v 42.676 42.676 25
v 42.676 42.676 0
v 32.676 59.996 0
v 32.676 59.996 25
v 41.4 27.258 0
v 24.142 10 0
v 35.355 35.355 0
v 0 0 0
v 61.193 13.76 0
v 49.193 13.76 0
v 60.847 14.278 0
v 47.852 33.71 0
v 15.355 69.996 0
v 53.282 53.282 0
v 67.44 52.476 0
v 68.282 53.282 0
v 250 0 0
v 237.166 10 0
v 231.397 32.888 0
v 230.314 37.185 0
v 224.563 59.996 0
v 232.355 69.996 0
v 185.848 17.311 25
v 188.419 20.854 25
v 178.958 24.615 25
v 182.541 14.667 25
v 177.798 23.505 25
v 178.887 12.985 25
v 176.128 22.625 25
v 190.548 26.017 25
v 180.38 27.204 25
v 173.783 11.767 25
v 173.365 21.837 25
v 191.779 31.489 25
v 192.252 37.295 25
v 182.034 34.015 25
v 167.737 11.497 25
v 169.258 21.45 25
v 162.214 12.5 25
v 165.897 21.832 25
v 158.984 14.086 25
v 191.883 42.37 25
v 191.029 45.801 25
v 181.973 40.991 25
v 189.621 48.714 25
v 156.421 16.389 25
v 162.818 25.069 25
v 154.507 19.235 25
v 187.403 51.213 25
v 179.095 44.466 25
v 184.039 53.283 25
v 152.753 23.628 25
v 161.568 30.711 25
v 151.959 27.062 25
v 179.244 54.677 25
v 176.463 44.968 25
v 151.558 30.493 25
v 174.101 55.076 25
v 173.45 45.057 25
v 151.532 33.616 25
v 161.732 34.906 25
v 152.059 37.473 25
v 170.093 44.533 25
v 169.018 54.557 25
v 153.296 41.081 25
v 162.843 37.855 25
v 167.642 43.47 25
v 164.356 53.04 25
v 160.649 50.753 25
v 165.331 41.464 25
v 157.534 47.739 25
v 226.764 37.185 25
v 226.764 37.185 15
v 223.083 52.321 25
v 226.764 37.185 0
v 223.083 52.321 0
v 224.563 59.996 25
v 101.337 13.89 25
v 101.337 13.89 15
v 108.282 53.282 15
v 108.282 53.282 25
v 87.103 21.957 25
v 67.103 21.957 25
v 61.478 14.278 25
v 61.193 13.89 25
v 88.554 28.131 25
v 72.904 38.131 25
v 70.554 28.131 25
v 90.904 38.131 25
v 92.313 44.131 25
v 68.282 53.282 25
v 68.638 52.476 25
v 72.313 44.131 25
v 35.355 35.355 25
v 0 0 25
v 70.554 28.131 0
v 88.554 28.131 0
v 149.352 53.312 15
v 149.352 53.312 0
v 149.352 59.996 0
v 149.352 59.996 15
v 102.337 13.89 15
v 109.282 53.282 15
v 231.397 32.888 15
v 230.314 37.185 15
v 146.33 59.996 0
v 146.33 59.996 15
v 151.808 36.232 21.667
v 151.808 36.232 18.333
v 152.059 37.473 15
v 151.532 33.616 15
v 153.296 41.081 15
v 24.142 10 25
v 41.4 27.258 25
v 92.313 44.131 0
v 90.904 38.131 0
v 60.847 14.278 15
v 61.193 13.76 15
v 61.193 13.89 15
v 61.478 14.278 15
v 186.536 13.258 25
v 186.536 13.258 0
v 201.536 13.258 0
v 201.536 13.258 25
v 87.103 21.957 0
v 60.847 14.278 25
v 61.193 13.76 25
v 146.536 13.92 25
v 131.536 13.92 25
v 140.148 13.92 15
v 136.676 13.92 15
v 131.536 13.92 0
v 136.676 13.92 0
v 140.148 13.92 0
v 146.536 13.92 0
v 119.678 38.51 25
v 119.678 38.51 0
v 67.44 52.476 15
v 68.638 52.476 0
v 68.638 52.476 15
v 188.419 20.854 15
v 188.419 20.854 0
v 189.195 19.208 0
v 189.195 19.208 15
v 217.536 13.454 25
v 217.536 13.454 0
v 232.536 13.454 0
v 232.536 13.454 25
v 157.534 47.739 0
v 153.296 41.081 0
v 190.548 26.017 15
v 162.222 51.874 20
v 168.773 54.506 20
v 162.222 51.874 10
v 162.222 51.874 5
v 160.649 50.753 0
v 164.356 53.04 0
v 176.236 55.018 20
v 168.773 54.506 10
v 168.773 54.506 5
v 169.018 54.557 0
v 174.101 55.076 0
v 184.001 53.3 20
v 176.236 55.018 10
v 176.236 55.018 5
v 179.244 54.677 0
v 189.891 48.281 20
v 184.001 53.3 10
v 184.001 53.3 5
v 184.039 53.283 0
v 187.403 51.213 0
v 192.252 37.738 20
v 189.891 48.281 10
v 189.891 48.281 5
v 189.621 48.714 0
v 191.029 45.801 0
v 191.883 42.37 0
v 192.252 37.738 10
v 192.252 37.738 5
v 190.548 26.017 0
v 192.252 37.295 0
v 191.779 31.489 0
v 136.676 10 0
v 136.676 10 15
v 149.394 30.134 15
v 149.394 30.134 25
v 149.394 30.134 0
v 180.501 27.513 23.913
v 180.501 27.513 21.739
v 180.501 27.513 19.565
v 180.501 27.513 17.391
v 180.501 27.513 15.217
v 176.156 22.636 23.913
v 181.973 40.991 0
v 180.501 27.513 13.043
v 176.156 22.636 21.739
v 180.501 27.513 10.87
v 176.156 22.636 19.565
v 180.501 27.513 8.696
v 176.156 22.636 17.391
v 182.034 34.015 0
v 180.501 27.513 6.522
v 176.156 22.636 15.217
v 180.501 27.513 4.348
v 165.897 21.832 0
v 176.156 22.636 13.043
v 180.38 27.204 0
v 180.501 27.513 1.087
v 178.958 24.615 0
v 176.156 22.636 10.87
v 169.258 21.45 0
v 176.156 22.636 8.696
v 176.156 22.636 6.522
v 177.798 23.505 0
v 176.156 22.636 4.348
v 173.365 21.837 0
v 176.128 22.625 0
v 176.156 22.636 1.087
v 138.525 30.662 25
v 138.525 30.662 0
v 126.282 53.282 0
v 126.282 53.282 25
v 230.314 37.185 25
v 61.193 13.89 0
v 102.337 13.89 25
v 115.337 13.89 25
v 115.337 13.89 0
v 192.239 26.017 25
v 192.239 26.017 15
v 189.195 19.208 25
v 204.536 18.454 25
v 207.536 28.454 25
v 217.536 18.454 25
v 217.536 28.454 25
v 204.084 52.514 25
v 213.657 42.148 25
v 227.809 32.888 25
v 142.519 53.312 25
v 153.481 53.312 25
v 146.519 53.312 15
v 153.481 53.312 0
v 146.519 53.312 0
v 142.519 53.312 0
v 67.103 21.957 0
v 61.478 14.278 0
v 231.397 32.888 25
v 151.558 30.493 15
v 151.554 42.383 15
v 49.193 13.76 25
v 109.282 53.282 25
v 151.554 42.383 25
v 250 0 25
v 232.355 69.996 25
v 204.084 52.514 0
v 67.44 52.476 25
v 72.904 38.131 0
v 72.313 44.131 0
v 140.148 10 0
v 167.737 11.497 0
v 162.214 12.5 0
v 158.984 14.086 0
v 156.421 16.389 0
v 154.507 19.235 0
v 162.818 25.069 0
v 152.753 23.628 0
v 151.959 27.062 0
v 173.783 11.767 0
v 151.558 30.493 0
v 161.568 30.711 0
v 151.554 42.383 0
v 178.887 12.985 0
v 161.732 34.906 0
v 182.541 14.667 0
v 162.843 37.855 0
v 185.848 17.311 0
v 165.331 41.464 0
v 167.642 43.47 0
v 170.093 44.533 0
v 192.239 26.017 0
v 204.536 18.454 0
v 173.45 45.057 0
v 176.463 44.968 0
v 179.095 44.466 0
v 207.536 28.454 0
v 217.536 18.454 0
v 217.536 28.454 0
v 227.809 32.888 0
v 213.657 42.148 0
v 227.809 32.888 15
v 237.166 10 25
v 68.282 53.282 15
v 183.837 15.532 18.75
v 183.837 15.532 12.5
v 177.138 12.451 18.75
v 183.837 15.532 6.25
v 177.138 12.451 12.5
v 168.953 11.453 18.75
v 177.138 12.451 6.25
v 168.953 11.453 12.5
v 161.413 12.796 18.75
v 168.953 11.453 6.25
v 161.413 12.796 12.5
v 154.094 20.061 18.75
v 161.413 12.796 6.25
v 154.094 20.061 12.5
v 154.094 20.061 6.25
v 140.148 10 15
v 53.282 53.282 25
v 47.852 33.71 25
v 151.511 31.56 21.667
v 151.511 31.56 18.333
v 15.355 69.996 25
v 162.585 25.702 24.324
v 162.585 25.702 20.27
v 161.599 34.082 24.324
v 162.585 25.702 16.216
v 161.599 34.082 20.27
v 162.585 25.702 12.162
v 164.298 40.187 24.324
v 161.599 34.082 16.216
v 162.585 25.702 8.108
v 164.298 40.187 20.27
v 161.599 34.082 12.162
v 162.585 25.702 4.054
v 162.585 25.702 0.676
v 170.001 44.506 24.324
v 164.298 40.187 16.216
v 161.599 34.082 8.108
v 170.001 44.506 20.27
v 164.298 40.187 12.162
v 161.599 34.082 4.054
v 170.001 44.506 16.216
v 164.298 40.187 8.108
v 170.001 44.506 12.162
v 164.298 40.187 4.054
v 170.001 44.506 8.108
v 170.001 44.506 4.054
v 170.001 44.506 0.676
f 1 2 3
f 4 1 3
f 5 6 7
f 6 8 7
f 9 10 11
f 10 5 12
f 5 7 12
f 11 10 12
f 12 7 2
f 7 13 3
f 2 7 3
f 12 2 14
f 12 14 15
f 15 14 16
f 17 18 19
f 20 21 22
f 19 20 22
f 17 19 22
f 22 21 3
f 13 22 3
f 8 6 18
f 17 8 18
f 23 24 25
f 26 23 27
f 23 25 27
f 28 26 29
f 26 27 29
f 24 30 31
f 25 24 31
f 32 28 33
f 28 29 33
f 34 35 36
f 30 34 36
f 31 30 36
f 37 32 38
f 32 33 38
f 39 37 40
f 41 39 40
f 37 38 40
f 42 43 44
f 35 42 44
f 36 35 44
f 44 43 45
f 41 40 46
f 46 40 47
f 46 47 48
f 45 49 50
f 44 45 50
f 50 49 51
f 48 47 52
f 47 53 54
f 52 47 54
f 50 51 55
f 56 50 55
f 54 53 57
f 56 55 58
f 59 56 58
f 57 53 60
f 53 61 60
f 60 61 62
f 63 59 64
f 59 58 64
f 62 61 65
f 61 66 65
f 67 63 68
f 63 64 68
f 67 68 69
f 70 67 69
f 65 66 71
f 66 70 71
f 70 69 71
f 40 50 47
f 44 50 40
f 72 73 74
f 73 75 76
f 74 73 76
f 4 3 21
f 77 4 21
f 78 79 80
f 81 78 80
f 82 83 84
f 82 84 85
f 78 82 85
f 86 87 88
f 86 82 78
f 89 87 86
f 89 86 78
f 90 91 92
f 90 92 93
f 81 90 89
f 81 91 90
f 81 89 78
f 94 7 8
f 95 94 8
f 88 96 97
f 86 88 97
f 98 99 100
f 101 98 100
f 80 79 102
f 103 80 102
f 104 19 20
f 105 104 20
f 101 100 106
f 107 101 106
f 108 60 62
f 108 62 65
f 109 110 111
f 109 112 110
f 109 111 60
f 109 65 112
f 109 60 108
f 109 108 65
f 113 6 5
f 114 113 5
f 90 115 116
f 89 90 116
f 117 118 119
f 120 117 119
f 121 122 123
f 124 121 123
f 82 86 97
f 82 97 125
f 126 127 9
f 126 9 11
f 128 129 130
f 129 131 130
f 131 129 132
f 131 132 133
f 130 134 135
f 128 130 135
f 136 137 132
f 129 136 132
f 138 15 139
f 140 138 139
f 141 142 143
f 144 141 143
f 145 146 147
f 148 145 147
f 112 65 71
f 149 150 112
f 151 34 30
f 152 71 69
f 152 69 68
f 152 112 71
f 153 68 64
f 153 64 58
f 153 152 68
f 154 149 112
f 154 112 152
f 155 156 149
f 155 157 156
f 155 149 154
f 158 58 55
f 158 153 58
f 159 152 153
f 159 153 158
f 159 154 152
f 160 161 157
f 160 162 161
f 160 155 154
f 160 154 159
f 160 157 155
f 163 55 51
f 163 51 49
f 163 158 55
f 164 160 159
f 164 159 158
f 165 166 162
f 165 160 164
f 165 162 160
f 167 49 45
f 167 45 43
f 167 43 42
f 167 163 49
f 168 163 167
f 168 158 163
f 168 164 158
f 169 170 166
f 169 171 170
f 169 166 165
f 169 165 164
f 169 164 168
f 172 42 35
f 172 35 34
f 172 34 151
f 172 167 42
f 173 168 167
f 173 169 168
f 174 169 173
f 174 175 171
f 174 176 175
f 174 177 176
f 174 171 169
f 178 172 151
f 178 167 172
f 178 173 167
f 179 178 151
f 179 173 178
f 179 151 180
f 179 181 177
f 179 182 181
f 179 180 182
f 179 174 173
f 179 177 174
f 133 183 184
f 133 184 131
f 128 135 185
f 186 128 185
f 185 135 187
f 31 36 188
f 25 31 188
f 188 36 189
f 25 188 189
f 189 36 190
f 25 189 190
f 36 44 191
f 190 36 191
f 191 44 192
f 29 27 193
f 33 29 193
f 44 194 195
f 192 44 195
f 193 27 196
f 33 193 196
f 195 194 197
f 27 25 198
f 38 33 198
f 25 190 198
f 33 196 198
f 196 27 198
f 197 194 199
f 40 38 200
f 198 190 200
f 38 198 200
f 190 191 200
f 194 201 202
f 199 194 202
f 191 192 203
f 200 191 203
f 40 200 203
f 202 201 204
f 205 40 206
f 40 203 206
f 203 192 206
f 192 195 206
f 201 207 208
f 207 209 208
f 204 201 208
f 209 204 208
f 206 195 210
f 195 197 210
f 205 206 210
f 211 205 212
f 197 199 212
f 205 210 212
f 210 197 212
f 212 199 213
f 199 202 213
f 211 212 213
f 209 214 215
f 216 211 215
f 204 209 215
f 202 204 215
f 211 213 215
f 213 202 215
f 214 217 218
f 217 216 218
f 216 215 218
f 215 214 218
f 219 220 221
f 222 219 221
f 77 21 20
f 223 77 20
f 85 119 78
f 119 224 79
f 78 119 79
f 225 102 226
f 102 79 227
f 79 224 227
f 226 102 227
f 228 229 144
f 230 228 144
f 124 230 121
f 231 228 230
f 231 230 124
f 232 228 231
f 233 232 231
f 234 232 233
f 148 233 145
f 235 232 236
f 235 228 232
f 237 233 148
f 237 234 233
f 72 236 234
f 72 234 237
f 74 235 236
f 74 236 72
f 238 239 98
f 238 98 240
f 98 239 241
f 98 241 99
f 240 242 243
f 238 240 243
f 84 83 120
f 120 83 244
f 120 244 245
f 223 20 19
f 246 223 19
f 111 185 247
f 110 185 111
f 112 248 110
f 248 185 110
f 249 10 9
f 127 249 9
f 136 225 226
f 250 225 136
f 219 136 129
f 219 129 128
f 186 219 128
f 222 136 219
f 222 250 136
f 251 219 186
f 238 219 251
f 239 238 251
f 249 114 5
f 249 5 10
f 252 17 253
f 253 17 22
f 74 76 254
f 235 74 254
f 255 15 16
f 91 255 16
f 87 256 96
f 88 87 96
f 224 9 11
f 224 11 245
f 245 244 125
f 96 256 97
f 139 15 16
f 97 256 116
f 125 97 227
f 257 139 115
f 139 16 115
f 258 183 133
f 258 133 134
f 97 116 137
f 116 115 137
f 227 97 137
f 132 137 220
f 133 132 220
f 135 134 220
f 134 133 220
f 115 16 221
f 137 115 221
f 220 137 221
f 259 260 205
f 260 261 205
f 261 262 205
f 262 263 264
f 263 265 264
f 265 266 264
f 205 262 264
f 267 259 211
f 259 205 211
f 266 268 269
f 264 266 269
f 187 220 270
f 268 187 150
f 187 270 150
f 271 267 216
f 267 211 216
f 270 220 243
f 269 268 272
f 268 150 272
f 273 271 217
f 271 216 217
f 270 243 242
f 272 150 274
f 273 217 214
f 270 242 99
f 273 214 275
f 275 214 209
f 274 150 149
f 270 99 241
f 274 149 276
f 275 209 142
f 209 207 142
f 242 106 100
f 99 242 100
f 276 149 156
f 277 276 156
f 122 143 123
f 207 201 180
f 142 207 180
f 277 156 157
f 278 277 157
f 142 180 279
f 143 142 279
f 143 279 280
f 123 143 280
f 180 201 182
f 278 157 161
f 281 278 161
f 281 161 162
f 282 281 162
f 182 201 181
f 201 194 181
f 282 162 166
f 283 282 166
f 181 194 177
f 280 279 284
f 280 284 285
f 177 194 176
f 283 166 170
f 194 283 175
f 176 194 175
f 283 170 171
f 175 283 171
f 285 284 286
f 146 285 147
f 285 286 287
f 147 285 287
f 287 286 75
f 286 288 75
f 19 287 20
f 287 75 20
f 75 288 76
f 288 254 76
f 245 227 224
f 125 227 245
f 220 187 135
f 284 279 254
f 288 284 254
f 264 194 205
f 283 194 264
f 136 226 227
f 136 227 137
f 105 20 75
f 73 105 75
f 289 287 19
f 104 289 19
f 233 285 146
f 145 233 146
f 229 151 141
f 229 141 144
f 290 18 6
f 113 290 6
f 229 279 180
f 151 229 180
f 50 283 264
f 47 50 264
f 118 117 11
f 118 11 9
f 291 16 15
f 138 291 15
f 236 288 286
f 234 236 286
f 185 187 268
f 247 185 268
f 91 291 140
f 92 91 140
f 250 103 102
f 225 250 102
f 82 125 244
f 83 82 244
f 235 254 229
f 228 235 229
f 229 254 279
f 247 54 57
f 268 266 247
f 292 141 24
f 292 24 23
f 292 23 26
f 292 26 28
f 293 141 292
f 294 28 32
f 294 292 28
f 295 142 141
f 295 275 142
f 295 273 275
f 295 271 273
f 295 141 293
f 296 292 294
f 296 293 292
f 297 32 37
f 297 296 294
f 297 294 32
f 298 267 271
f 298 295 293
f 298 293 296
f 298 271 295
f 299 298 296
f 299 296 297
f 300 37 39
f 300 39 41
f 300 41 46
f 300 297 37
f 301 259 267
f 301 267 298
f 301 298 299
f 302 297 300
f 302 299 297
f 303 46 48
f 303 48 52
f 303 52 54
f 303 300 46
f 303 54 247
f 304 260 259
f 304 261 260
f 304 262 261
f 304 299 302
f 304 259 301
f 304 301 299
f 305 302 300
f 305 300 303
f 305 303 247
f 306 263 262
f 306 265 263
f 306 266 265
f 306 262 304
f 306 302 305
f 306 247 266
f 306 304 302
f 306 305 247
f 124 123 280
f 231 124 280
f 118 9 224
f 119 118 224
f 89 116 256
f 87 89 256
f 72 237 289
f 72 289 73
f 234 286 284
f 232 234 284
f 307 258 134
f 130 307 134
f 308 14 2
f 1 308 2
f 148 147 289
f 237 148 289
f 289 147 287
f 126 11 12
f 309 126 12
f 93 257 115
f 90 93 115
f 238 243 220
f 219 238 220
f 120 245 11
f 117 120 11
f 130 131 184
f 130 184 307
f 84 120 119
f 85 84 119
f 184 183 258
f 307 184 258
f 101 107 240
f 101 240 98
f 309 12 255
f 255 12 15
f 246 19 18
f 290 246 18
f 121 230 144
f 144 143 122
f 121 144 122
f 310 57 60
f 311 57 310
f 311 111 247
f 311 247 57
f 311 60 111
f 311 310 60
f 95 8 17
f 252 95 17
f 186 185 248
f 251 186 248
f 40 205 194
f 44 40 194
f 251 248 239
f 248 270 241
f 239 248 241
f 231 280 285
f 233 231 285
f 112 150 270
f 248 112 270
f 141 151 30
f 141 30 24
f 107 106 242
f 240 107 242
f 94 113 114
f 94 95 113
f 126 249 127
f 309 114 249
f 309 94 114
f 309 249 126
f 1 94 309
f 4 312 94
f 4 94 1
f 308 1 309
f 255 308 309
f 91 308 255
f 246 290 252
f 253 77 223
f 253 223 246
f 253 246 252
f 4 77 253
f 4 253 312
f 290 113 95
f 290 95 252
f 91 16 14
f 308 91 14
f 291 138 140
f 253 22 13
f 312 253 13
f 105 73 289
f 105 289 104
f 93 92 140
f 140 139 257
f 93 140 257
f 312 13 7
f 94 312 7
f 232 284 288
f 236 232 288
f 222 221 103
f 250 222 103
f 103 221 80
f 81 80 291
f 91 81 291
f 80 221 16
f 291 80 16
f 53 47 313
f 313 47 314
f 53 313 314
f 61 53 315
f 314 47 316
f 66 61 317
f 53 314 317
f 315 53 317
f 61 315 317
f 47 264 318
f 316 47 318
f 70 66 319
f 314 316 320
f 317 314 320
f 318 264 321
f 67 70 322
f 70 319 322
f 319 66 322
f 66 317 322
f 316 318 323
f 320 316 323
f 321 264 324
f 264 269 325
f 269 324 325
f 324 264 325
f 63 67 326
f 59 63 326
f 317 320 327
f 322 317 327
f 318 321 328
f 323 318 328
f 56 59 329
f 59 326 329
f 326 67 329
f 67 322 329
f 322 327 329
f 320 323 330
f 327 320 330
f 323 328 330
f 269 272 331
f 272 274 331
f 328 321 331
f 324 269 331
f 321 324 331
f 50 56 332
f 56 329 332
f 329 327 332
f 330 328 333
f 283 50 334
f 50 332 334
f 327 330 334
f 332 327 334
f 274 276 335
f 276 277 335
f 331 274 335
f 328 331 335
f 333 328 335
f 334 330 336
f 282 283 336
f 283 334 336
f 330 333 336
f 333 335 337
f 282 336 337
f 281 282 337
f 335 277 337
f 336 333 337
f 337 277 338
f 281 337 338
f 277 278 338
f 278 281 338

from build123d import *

# Parameters (mm, degrees)
F1_DEPTH = 25
F0_W     = 3.4720152617
F0_H     = 3.9200305776
F2_DEPTH = 15


# Not quite as in the source:
# - ends of sketch curves that miss each other by under 0.0002 mm in the source are joined
# - the dataset's text gives a spline's control points without its knots; the knots are read off the source's solid
# - a feature names something its author has since deleted; it is built from what else it names


with BuildPart() as f1:
    # F0 (on Top) → F1 (new body)
    with BuildSketch(Plane.XY):
        Polygon((35.3553390593, 35.3553390593), (0, 0), (250, 0), (232.3553390593, 69.9963552107), (15.3553390593, 69.9963552107), align=None)
        Polygon((149.3519097567, 59.9963530121), (224.56330661, 59.9963530121), (230.3136809852, 37.1846226695), (231.3968486735, 32.8876973548), (237.166372237, 10.0000021986), (140.1480585337, 10.0000021986), (136.676043272, 10.0000021986), (24.1421409317, 10.0000021986), (41.4001874912, 27.2580487582), (47.8522307846, 33.7100920516), (42.6758487445, 42.6758487445), (32.6758509431, 59.9963530121), (146.3302671909, 59.9963530121), align=None, mode=Mode.SUBTRACT)
        Polygon((53.2824504623, 53.2824504623), (42.6758487445, 42.6758487445), (47.8522307846, 33.7100920516), (67.4404504829, 52.4758059113), (68.2824504623, 53.2824504623), align=None)
        Polygon((60.8468717116, 14.278005959), (47.8522307846, 33.7100920516), (41.4001874912, 27.2580487582), (49.1933937334, 13.7598195929), (61.1933937334, 13.7598195929), align=None)
    extrude(amount=F1_DEPTH)


with BuildPart() as f1b:
    # F0 (on Top) → F1, piece 2 (new body)
    with BuildSketch(Plane.XY):
        Polygon((88.5540837341, 28.1308456181), (90.9036234209, 38.1308456181), (72.9036234209, 38.1308456181), (70.5540837341, 28.1308456181), align=None)
        Polygon((108.2824504623, 53.2824504623), (68.2824504623, 53.2824504623), (68.6377434378, 52.4758059113), (72.313347233, 44.1308456181), (92.313347233, 44.1308456181), (90.9036234209, 38.1308456181), (88.5540837341, 28.1308456181), (87.1034676285, 21.9568017674), (67.1034676285, 21.9568017674), (61.477565132, 14.278005959), (61.1933937334, 13.8901403418), (101.3365233556, 13.8901403418), align=None)
    extrude(amount=F1_DEPTH)



with BuildPart() as f1c:
    # F0 (on Top) → F1, piece 3 (new body)
    with BuildSketch(Plane.XY):
        Polygon((153.4814404268, 53.3123428967), (149.3519097567, 53.3123428967), (146.5191096067, 53.3123428967), (142.5191015005, 53.3123428967), (138.5251934142, 30.6617645774), (126.2824504623, 53.2824504623), (109.2824504623, 53.2824504623), (102.3365233556, 13.8901403418), (115.3365233556, 13.8901403418), (119.6777277973, 38.5103341671), (131.5355133201, 13.9200327762), (136.676043272, 13.9200327762), (140.1480585337, 13.9200327762), (146.5355133201, 13.9200327762), (149.3944048747, 30.1336124743), (151.5543764817, 42.3834201799), align=None)
    extrude(amount=F1_DEPTH)


with BuildPart() as f1d:
    # F0 (on Top) → F1, piece 4 (new body)
    with BuildSketch(Plane.XY):
        with BuildLine():
            add(Edge.make_bspline(
                [(153.2957728652, 41.0807725054), (153.49766281, 41.5309282211), (155.3500865512, 45.3378659555), (161.5552143615, 53.4867465492), (176.1548241084, 56.3217499328), (193.5548048204, 51.0510310034), (192.6995287251, 33.1029715051), (190.5478645245, 26.016644206)],
                knots=[0.0743708641, 0.0743708641, 0.0743708641, 0.0743708641, 0.0883183193, 0.1917010674, 0.3023367007, 0.4162516271, 0.5490950731, 0.5490950731, 0.5490950731, 0.5490950731], degree=3))
            add(Edge.make_bspline(
                [(151.5315026045, 33.6161878365), (151.6634499925, 36.3480245715), (152.2192517782, 38.6804443414), (153.2957728652, 41.0807725054)],
                knots=[0, 0, 0, 0, 0.0743708641, 0.0743708641, 0.0743708641, 0.0743708641], degree=3))
            add(Edge.make_bspline(
                [(151.5581660211, 30.4933039686), (151.4916370849, 31.5702465606), (151.4833764702, 32.6197850769), (151.5315026045, 33.6161878365)],
                knots=[0.9728741717, 0.9728741717, 0.9728741717, 0.9728741717, 1, 1, 1, 1], degree=3))
            add(Edge.make_bspline(
                [(188.4193204432, 20.8541177869), (186.4225620314, 17.2582664486), (179.6863041093, 11.4034157724), (160.3055787763, 10.4275817806), (153.2214749313, 20.0421386094), (151.7433054324, 27.4963446143), (151.5581660211, 30.4933039686)],
                knots=[0.5854070027, 0.5854070027, 0.5854070027, 0.5854070027, 0.6722296295, 0.7975352428, 0.8973873208, 0.9728741717, 0.9728741717, 0.9728741717, 0.9728741717], degree=3))
            add(Edge.make_bspline(
                [(190.5478645245, 26.016644206), (190.3967980643, 25.5191193687), (189.7761974015, 23.6315541865), (189.0399275657, 21.9717346898), (188.4193204432, 20.8541177869)],
                knots=[0.5490950731, 0.5490950731, 0.5490950731, 0.5490950731, 0.5584218951, 0.5854070027, 0.5854070027, 0.5854070027, 0.5854070027], degree=3))
        make_face()
        with BuildLine():
            add(Edge.make_bspline(
                [(162.8184250503, 25.0692523461), (162.7388528349, 25.2709199434), (162.5250729743, 25.8491123795), (162.2111113791, 26.8772771924), (161.811446171, 28.5859325459), (161.5680124914, 30.3698864013), (161.490617043, 32.0313577817), (161.5032118997, 32.7877081125), (161.5198585813, 33.1337514359)],
                knots=[0.8971962129, 0.8971962129, 0.8971962129, 0.8971962129, 0.90625, 0.921875, 0.9375, 0.96875, 0.984375, 1, 1, 1, 1], degree=3))
            add(Edge.make_bspline(
                [(161.5198585813, 33.1337514359), (161.5365052629, 33.4797947593), (161.5904971328, 34.1076177221), (161.7198338174, 34.8971109654), (161.8983772283, 35.617959176), (162.1037900469, 36.2305480911), (162.3191108206, 36.7643620724), (162.5109148317, 37.1933987719), (162.7379267984, 37.6574642255), (163.0921353714, 38.326605495), (163.596210236, 39.1811127594), (164.287470415, 40.1970519056), (165.0414513207, 41.1551577869), (165.8327231283, 42.017135319), (166.4983498938, 42.6285934344), (167.0176778213, 43.0428000772), (167.3981141086, 43.3156806379), (167.7595288983, 43.5467960735), (168.1488651256, 43.766963423), (168.5654607343, 43.9738592368), (169.1603655772, 44.23185257), (169.9804869671, 44.5178805652), (171.0896341478, 44.7915612101), (172.3184150489, 44.9834054828), (173.6559028444, 45.0826399089), (174.7295299917, 45.0813201083), (175.4692709806, 45.0471315589), (175.9685909899, 45.0153875781), (176.5764482855, 44.960404607), (177.2752413398, 44.8700053931), (178.152789541, 44.7188709988), (178.7412145092, 44.5732668808), (179.0910574906, 44.4674492213), (179.0945257888, 44.4663980322)],
                knots=[0, 0, 0, 0, 0.015625, 0.03125, 0.046875, 0.0625, 0.0703125, 0.078125, 0.0859375, 0.09375, 0.109375, 0.125, 0.140625, 0.15625, 0.171875, 0.1796875, 0.1875, 0.1953125, 0.203125, 0.2109375, 0.21875, 0.234375, 0.25, 0.265625, 0.28125, 0.296875, 0.30078125, 0.3046875, 0.3125, 0.3203125, 0.328125, 0.34375, 0.3439066519, 0.3439066519, 0.3439066519, 0.3439066519], degree=3))
            add(Edge.make_bspline(
                [(179.0945257888, 44.4663980322), (179.4369974189, 44.3626000224), (180.0408289592, 44.137858269), (180.6603332198, 43.8043498556), (180.954614815, 43.5775919437), (181.1038370269, 43.4315691806), (181.1895827034, 43.3310307887), (181.2538264485, 43.2395291398), (181.3046724038, 43.1550069204), (181.3582155541, 43.05569095), (181.422796919, 42.9212624239), (181.5199173994, 42.6948431225), (181.7085595453, 42.1772024114), (181.8753089955, 41.5231873988), (181.9696544415, 41.0096622148), (181.9730783847, 40.9907957298)],
                knots=[0.3439066519, 0.3439066519, 0.3439066519, 0.3439066519, 0.359375, 0.375, 0.390625, 0.3984375, 0.40625, 0.4140625, 0.41796875, 0.421875, 0.42578125, 0.4296875, 0.4375, 0.453125, 0.4537178211, 0.4537178211, 0.4537178211, 0.4537178211], degree=3))
            add(Edge.make_bspline(
                [(181.9730783847, 40.9907957298), (182.0598994005, 40.512397778), (182.2045363428, 39.41183358), (182.2797979507, 37.4823107399), (182.193566141, 35.3678582229), (181.9493626032, 33.2017921364), (181.5644163989, 31.0887847577), (181.0667847965, 29.1323622869), (180.5011449009, 27.4494312491), (179.9317447836, 26.1476864655), (179.3824865747, 25.1785905134), (178.8685398921, 24.4779841747), (178.3709172748, 23.9520794031), (177.8264944089, 23.5060953751), (177.1374617731, 23.0738355235), (176.2112022482, 22.6358864412), (174.9558716393, 22.2007569681), (173.4559950281, 21.8323747048), (171.8198374216, 21.5722282716), (170.1442177268, 21.4412866926), (168.5280439261, 21.4466193999), (167.3160139795, 21.558065936), (166.4822451641, 21.6958640201), (166.0986472535, 21.7808626756), (165.9163137021, 21.8272428827), (165.8971010414, 21.8322026836)],
                knots=[0.4537178211, 0.4537178211, 0.4537178211, 0.4537178211, 0.46875, 0.484375, 0.5, 0.515625, 0.53125, 0.546875, 0.5625, 0.578125, 0.59375, 0.609375, 0.625, 0.640625, 0.65625, 0.671875, 0.6875, 0.703125, 0.71875, 0.734375, 0.75, 0.765625, 0.7734375, 0.78125, 0.7821827292, 0.7821827292, 0.7821827292, 0.7821827292], degree=3))
            add(Edge.make_bspline(
                [(165.8971010414, 21.8322026836), (165.7553892759, 21.868785963), (165.5531970067, 21.9272567748), (165.3254056153, 22.0041417656), (165.1739060305, 22.0612615773), (165.0494707627, 22.1134592968), (164.8977695401, 22.1837784003), (164.7376634219, 22.2699020236), (164.5740601511, 22.3743238889), (164.3757102389, 22.5229923761), (164.1329229874, 22.7478764528), (163.795317607, 23.1578632169), (163.4078371213, 23.7696356085), (163.0732924198, 24.4470716455), (162.8761783378, 24.9228825776), (162.8184250503, 25.0692523461)],
                knots=[0.7821827292, 0.7821827292, 0.7821827292, 0.7821827292, 0.7890625, 0.79296875, 0.796875, 0.80078125, 0.8046875, 0.8125, 0.8203125, 0.828125, 0.84375, 0.859375, 0.875, 0.890625, 0.8971962129, 0.8971962129, 0.8971962129, 0.8971962129], degree=3))
        make_face(mode=Mode.SUBTRACT)
        with BuildLine():
            add(Edge.make_bspline(
                [(179.0945257888, 44.4663980322), (179.4369974189, 44.3626000224), (180.0408289592, 44.137858269), (180.6603332198, 43.8043498556), (180.954614815, 43.5775919437), (181.1038370269, 43.4315691806), (181.1895827034, 43.3310307887), (181.2538264485, 43.2395291398), (181.3046724038, 43.1550069204), (181.3582155541, 43.05569095), (181.422796919, 42.9212624239), (181.5199173994, 42.6948431225), (181.7085595453, 42.1772024114), (181.8753089955, 41.5231873988), (181.9696544415, 41.0096622148), (181.9730783847, 40.9907957298)],
                knots=[0.3439066519, 0.3439066519, 0.3439066519, 0.3439066519, 0.359375, 0.375, 0.390625, 0.3984375, 0.40625, 0.4140625, 0.41796875, 0.421875, 0.42578125, 0.4296875, 0.4375, 0.453125, 0.4537178211, 0.4537178211, 0.4537178211, 0.4537178211], degree=3))
            Line((179.0945257888, 44.4663980322), (162.8183697977, 25.0692305451))
            add(Edge.make_bspline(
                [(165.8971010414, 21.8322026836), (165.7553892759, 21.868785963), (165.5531970067, 21.9272567748), (165.3254056153, 22.0041417656), (165.1739060305, 22.0612615773), (165.0494707627, 22.1134592968), (164.8977695401, 22.1837784003), (164.7376634219, 22.2699020236), (164.5740601511, 22.3743238889), (164.3757102389, 22.5229923761), (164.1329229874, 22.7478764528), (163.795317607, 23.1578632169), (163.4078371213, 23.7696356085), (163.0732924198, 24.4470716455), (162.8761783378, 24.9228825776), (162.8183697977, 25.0692305451)],
                knots=[0.7821827292, 0.7821827292, 0.7821827292, 0.7821827292, 0.7890625, 0.79296875, 0.796875, 0.80078125, 0.8046875, 0.8125, 0.8203125, 0.828125, 0.84375, 0.859375, 0.875, 0.890625, 0.8971962129, 0.8971962129, 0.8971962129, 0.8971962129], degree=3))
            Line((165.8971010414, 21.8322026836), (181.9730783847, 40.9907957298))
        make_face()
    extrude(amount=F1_DEPTH)


with BuildPart() as f1e:
    # F0 (on Top) → F1, piece 5 (new body)
    with BuildSketch(Plane.XY):
        Polygon((227.8092346476, 32.8876973548), (226.7642129222, 37.1846226695), (223.0829559751, 52.321232543), (204.0839364723, 52.5142556785), (192.2389093289, 26.016644206), (189.1953905746, 19.20821933), (186.5355133201, 13.258009744), (201.5355133201, 13.258009744), (204.5355133201, 18.4541621667), (217.5355133201, 18.4541621667), (217.5355133201, 13.4541621667), (232.5355133201, 13.4541621667), align=None)
        Polygon((213.6570562804, 42.148201446), (217.5355133201, 28.4541621667), (207.5355133201, 28.4541621667), align=None, mode=Mode.SUBTRACT)
    extrude(amount=F1_DEPTH)


with BuildPart() as f1b_1:
    add(f1b.part)

    add(f1c.part)  # F2 merges F1c

    add(f1d.part)  # F2 merges F1d

    add(f1e.part)  # F2 merges F1e
    # F0 (on Top) → F2 (join)
    with BuildSketch(Plane.XY):
        Polygon((149.3519097567, 53.3123428967), (149.3519097567, 59.9963530121), (146.3302671909, 59.9963530121), (146.5191096067, 53.3123428967), align=None)
        with Locations((138.4120509028, 11.9600174874)):
            Rectangle(F0_W, F0_H)
        with BuildLine():
            Line((153.2957728652, 41.0807725054), (151.5543764817, 42.3834201799))
            Line((151.5543764817, 42.3834201799), (149.3944048747, 30.1336124743))
            Line((149.3944048747, 30.1336124743), (151.5581660211, 30.4933039686))
            add(Edge.make_bspline(
                [(151.5581660211, 30.4933039686), (151.4916370849, 31.5702465606), (151.4833764702, 32.6197850769), (151.5315026045, 33.6161878365)],
                knots=[0.9728741717, 0.9728741717, 0.9728741717, 0.9728741717, 1, 1, 1, 1], degree=3))
            add(Edge.make_bspline(
                [(151.5315026045, 33.6161878365), (151.6634499925, 36.3480245715), (152.2192517782, 38.6804443414), (153.2957728652, 41.0807725054)],
                knots=[0, 0, 0, 0, 0.0743708641, 0.0743708641, 0.0743708641, 0.0743708641], degree=3))
        make_face()
        with BuildLine():
            Line((189.1953905746, 19.20821933), (192.2389093289, 26.016644206))
            Line((192.2389093289, 26.016644206), (190.5478645245, 26.016644206))
            add(Edge.make_bspline(
                [(190.5478645245, 26.016644206), (190.3967980643, 25.5191193687), (189.7761974015, 23.6315541865), (189.0399275657, 21.9717346898), (188.4193204432, 20.8541177869)],
                knots=[0.5490950731, 0.5490950731, 0.5490950731, 0.5490950731, 0.5584218951, 0.5854070027, 0.5854070027, 0.5854070027, 0.5854070027], degree=3))
            Line((188.4193204432, 20.8541177869), (189.1953905746, 19.20821933))
        make_face()
        Polygon((231.3968486735, 32.8876973548), (230.3136809852, 37.1846226695), (226.7642129222, 37.1846226695), (227.8092346476, 32.8876973548), align=None)
        Polygon((109.2824504623, 53.2824504623), (108.2824504623, 53.2824504623), (101.3365233556, 13.8901403418), (102.3365233556, 13.8901403418), align=None)
        Polygon((61.477565132, 14.278005959), (60.8468717116, 14.278005959), (61.1933937334, 13.7598195929), (61.1933937334, 13.8901403418), align=None)
        Polygon((68.2824504623, 53.2824504623), (67.4404504829, 52.4758059113), (68.6377434378, 52.4758059113), align=None)
    extrude(amount=F2_DEPTH)


solid = Compound([f1.part, f1b_1.part])
